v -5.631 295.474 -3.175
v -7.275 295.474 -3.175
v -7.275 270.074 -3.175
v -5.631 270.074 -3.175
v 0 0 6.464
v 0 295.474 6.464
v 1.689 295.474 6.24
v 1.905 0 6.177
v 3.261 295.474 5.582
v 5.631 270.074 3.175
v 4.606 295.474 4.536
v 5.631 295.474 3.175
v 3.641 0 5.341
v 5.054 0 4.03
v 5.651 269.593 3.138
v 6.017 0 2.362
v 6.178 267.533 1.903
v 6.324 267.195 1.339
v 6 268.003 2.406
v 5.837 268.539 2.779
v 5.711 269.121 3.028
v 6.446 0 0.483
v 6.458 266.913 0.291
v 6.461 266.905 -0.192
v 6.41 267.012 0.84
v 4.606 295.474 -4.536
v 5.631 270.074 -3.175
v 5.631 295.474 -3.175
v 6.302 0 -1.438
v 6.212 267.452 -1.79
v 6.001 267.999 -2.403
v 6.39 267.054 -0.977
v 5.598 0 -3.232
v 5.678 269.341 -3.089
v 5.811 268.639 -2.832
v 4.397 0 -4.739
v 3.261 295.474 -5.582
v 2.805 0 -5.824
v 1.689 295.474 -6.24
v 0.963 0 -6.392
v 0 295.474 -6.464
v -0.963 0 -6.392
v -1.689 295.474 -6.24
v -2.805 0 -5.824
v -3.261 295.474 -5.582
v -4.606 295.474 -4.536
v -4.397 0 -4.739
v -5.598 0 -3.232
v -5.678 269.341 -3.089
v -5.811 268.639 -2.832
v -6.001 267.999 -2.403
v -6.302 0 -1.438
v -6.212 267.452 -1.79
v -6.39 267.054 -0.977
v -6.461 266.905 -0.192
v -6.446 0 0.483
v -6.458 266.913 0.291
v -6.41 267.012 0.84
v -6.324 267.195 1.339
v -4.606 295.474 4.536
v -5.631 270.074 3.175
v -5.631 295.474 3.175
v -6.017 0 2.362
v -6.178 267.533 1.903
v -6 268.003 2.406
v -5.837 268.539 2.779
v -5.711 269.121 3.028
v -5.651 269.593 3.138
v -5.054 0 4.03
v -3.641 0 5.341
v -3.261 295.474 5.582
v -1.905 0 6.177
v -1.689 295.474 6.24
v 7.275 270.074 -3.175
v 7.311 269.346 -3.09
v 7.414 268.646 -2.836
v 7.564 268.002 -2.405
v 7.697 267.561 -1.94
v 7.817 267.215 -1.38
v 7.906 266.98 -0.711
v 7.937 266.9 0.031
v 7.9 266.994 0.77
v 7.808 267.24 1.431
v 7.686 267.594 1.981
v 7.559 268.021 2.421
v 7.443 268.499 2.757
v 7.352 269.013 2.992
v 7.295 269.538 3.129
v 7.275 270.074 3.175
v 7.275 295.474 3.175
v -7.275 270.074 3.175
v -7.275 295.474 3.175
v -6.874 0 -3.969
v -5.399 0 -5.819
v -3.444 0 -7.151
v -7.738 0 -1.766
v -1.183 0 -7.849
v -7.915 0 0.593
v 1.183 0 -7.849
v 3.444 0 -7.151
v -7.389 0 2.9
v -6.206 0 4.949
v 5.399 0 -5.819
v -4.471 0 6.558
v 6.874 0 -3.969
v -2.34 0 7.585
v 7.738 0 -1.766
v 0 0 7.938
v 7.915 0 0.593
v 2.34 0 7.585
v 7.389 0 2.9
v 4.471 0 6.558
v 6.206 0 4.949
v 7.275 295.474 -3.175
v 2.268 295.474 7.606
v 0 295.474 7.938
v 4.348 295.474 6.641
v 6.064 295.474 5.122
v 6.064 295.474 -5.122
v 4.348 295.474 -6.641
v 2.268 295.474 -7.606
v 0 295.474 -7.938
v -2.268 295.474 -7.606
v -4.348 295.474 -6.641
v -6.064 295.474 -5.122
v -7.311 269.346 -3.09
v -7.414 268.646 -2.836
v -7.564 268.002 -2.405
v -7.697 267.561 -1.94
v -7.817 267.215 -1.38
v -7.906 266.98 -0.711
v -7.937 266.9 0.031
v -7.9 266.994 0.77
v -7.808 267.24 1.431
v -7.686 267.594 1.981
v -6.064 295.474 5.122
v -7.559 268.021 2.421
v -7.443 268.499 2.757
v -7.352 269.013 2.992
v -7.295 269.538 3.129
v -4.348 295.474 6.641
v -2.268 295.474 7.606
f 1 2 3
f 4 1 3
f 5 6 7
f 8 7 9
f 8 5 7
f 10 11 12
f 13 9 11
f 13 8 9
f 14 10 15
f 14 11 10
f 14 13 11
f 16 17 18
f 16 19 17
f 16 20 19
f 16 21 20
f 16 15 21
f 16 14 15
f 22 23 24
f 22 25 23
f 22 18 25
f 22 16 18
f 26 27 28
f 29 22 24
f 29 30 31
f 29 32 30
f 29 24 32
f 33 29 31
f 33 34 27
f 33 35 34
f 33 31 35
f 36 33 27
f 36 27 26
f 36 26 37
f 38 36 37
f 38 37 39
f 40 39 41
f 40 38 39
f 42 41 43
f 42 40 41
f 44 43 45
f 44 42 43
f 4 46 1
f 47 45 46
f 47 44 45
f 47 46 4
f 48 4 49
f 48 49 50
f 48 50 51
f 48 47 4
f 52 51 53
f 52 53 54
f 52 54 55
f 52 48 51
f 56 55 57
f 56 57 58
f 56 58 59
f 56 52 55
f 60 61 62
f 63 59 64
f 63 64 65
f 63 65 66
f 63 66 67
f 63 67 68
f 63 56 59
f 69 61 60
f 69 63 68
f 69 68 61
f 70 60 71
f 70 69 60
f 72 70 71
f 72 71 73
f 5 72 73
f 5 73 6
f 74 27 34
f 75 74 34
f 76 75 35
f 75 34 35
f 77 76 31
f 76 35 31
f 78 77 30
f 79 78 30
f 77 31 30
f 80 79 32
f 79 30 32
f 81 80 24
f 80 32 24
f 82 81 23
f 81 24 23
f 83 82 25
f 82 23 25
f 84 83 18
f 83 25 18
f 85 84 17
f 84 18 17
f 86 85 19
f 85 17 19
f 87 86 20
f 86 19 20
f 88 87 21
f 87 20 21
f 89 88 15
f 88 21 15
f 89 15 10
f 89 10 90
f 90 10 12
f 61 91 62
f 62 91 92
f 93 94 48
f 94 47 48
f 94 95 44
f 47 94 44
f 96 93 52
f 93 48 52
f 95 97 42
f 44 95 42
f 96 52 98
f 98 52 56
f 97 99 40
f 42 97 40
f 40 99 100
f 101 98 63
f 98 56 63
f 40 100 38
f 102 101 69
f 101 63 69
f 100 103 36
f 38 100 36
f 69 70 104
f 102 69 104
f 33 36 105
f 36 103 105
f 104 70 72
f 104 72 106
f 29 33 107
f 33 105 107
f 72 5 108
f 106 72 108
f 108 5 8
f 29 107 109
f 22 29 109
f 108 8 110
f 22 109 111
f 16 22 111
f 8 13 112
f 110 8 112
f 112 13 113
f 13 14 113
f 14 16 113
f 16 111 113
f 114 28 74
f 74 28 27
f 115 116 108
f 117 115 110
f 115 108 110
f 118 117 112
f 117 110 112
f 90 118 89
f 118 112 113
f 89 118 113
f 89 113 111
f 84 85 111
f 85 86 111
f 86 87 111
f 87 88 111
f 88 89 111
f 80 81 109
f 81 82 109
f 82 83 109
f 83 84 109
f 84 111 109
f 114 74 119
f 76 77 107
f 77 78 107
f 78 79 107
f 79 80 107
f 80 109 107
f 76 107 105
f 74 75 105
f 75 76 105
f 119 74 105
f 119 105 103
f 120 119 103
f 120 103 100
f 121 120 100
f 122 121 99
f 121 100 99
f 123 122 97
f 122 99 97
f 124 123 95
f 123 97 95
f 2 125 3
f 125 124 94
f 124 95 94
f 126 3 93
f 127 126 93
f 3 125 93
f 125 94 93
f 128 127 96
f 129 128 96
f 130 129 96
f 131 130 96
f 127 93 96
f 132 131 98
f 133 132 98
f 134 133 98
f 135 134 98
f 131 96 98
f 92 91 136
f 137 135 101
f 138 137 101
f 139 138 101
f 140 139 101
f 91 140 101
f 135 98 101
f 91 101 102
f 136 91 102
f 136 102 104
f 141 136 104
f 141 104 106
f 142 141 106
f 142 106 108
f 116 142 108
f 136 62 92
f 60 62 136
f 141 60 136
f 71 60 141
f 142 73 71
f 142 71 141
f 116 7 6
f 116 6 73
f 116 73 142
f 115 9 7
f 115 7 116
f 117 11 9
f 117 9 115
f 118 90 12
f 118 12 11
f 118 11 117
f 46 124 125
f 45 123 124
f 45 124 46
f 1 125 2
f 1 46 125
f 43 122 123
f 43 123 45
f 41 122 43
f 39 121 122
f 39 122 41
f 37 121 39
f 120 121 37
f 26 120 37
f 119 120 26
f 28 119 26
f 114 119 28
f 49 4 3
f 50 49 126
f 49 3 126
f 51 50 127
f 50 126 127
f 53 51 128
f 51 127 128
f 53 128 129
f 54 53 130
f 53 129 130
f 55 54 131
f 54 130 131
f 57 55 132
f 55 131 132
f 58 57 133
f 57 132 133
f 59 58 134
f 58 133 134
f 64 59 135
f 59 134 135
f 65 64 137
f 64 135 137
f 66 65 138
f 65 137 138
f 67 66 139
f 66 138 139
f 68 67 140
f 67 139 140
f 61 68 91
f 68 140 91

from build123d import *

# Parameters (mm, degrees)
SKETCH1_R               = 7.9375
SKETCH1_R_2             = 6.4643
BOSS_EXTRUDE1_DEPTH     = 295.474372219
CUT_EXTRUDE1_DEPTH      = 296.687525017
CUT_EXTRUDE1_DEPTH_BACK = 296.687525017


with BuildPart() as part:
    # Sketch1 → Boss-Extrude1 (new body)
    with BuildSketch(Plane(origin=(0, 0, 0), x_dir=(1, 0, 0), z_dir=(0, 1, 0))):
        with Locations(Location((0, 0, 0), (0, 0, 270))):
            Circle(SKETCH1_R)
        with Locations(Location((0, 0, 0), (0, 0, 270))):
            Circle(SKETCH1_R_2, mode=Mode.SUBTRACT)
    extrude(amount=BOSS_EXTRUDE1_DEPTH)

    # Sketch4 → Cut-Extrude1 (cut, two sides: drawn at the far end of the back side and taken through both)
    with BuildSketch(Plane(origin=(0, 0, 0), x_dir=(0, 0, -1), z_dir=(1, 0, 0)).offset(-CUT_EXTRUDE1_DEPTH_BACK)):
        with BuildLine():
            Line((3.175, 320.874372219), (3.175, 270.074372219))
            ThreePointArc((3.175, 270.074372219), (0, 266.899372219), (-3.175, 270.074372219))
            Line((-3.175, 270.074372219), (-3.175, 320.874372219))
            ThreePointArc((-3.175, 320.874372219), (0, 324.049372219), (3.175, 320.874372219))
        make_face()
    extrude(amount=CUT_EXTRUDE1_DEPTH + CUT_EXTRUDE1_DEPTH_BACK, mode=Mode.SUBTRACT)


solid = part.part
